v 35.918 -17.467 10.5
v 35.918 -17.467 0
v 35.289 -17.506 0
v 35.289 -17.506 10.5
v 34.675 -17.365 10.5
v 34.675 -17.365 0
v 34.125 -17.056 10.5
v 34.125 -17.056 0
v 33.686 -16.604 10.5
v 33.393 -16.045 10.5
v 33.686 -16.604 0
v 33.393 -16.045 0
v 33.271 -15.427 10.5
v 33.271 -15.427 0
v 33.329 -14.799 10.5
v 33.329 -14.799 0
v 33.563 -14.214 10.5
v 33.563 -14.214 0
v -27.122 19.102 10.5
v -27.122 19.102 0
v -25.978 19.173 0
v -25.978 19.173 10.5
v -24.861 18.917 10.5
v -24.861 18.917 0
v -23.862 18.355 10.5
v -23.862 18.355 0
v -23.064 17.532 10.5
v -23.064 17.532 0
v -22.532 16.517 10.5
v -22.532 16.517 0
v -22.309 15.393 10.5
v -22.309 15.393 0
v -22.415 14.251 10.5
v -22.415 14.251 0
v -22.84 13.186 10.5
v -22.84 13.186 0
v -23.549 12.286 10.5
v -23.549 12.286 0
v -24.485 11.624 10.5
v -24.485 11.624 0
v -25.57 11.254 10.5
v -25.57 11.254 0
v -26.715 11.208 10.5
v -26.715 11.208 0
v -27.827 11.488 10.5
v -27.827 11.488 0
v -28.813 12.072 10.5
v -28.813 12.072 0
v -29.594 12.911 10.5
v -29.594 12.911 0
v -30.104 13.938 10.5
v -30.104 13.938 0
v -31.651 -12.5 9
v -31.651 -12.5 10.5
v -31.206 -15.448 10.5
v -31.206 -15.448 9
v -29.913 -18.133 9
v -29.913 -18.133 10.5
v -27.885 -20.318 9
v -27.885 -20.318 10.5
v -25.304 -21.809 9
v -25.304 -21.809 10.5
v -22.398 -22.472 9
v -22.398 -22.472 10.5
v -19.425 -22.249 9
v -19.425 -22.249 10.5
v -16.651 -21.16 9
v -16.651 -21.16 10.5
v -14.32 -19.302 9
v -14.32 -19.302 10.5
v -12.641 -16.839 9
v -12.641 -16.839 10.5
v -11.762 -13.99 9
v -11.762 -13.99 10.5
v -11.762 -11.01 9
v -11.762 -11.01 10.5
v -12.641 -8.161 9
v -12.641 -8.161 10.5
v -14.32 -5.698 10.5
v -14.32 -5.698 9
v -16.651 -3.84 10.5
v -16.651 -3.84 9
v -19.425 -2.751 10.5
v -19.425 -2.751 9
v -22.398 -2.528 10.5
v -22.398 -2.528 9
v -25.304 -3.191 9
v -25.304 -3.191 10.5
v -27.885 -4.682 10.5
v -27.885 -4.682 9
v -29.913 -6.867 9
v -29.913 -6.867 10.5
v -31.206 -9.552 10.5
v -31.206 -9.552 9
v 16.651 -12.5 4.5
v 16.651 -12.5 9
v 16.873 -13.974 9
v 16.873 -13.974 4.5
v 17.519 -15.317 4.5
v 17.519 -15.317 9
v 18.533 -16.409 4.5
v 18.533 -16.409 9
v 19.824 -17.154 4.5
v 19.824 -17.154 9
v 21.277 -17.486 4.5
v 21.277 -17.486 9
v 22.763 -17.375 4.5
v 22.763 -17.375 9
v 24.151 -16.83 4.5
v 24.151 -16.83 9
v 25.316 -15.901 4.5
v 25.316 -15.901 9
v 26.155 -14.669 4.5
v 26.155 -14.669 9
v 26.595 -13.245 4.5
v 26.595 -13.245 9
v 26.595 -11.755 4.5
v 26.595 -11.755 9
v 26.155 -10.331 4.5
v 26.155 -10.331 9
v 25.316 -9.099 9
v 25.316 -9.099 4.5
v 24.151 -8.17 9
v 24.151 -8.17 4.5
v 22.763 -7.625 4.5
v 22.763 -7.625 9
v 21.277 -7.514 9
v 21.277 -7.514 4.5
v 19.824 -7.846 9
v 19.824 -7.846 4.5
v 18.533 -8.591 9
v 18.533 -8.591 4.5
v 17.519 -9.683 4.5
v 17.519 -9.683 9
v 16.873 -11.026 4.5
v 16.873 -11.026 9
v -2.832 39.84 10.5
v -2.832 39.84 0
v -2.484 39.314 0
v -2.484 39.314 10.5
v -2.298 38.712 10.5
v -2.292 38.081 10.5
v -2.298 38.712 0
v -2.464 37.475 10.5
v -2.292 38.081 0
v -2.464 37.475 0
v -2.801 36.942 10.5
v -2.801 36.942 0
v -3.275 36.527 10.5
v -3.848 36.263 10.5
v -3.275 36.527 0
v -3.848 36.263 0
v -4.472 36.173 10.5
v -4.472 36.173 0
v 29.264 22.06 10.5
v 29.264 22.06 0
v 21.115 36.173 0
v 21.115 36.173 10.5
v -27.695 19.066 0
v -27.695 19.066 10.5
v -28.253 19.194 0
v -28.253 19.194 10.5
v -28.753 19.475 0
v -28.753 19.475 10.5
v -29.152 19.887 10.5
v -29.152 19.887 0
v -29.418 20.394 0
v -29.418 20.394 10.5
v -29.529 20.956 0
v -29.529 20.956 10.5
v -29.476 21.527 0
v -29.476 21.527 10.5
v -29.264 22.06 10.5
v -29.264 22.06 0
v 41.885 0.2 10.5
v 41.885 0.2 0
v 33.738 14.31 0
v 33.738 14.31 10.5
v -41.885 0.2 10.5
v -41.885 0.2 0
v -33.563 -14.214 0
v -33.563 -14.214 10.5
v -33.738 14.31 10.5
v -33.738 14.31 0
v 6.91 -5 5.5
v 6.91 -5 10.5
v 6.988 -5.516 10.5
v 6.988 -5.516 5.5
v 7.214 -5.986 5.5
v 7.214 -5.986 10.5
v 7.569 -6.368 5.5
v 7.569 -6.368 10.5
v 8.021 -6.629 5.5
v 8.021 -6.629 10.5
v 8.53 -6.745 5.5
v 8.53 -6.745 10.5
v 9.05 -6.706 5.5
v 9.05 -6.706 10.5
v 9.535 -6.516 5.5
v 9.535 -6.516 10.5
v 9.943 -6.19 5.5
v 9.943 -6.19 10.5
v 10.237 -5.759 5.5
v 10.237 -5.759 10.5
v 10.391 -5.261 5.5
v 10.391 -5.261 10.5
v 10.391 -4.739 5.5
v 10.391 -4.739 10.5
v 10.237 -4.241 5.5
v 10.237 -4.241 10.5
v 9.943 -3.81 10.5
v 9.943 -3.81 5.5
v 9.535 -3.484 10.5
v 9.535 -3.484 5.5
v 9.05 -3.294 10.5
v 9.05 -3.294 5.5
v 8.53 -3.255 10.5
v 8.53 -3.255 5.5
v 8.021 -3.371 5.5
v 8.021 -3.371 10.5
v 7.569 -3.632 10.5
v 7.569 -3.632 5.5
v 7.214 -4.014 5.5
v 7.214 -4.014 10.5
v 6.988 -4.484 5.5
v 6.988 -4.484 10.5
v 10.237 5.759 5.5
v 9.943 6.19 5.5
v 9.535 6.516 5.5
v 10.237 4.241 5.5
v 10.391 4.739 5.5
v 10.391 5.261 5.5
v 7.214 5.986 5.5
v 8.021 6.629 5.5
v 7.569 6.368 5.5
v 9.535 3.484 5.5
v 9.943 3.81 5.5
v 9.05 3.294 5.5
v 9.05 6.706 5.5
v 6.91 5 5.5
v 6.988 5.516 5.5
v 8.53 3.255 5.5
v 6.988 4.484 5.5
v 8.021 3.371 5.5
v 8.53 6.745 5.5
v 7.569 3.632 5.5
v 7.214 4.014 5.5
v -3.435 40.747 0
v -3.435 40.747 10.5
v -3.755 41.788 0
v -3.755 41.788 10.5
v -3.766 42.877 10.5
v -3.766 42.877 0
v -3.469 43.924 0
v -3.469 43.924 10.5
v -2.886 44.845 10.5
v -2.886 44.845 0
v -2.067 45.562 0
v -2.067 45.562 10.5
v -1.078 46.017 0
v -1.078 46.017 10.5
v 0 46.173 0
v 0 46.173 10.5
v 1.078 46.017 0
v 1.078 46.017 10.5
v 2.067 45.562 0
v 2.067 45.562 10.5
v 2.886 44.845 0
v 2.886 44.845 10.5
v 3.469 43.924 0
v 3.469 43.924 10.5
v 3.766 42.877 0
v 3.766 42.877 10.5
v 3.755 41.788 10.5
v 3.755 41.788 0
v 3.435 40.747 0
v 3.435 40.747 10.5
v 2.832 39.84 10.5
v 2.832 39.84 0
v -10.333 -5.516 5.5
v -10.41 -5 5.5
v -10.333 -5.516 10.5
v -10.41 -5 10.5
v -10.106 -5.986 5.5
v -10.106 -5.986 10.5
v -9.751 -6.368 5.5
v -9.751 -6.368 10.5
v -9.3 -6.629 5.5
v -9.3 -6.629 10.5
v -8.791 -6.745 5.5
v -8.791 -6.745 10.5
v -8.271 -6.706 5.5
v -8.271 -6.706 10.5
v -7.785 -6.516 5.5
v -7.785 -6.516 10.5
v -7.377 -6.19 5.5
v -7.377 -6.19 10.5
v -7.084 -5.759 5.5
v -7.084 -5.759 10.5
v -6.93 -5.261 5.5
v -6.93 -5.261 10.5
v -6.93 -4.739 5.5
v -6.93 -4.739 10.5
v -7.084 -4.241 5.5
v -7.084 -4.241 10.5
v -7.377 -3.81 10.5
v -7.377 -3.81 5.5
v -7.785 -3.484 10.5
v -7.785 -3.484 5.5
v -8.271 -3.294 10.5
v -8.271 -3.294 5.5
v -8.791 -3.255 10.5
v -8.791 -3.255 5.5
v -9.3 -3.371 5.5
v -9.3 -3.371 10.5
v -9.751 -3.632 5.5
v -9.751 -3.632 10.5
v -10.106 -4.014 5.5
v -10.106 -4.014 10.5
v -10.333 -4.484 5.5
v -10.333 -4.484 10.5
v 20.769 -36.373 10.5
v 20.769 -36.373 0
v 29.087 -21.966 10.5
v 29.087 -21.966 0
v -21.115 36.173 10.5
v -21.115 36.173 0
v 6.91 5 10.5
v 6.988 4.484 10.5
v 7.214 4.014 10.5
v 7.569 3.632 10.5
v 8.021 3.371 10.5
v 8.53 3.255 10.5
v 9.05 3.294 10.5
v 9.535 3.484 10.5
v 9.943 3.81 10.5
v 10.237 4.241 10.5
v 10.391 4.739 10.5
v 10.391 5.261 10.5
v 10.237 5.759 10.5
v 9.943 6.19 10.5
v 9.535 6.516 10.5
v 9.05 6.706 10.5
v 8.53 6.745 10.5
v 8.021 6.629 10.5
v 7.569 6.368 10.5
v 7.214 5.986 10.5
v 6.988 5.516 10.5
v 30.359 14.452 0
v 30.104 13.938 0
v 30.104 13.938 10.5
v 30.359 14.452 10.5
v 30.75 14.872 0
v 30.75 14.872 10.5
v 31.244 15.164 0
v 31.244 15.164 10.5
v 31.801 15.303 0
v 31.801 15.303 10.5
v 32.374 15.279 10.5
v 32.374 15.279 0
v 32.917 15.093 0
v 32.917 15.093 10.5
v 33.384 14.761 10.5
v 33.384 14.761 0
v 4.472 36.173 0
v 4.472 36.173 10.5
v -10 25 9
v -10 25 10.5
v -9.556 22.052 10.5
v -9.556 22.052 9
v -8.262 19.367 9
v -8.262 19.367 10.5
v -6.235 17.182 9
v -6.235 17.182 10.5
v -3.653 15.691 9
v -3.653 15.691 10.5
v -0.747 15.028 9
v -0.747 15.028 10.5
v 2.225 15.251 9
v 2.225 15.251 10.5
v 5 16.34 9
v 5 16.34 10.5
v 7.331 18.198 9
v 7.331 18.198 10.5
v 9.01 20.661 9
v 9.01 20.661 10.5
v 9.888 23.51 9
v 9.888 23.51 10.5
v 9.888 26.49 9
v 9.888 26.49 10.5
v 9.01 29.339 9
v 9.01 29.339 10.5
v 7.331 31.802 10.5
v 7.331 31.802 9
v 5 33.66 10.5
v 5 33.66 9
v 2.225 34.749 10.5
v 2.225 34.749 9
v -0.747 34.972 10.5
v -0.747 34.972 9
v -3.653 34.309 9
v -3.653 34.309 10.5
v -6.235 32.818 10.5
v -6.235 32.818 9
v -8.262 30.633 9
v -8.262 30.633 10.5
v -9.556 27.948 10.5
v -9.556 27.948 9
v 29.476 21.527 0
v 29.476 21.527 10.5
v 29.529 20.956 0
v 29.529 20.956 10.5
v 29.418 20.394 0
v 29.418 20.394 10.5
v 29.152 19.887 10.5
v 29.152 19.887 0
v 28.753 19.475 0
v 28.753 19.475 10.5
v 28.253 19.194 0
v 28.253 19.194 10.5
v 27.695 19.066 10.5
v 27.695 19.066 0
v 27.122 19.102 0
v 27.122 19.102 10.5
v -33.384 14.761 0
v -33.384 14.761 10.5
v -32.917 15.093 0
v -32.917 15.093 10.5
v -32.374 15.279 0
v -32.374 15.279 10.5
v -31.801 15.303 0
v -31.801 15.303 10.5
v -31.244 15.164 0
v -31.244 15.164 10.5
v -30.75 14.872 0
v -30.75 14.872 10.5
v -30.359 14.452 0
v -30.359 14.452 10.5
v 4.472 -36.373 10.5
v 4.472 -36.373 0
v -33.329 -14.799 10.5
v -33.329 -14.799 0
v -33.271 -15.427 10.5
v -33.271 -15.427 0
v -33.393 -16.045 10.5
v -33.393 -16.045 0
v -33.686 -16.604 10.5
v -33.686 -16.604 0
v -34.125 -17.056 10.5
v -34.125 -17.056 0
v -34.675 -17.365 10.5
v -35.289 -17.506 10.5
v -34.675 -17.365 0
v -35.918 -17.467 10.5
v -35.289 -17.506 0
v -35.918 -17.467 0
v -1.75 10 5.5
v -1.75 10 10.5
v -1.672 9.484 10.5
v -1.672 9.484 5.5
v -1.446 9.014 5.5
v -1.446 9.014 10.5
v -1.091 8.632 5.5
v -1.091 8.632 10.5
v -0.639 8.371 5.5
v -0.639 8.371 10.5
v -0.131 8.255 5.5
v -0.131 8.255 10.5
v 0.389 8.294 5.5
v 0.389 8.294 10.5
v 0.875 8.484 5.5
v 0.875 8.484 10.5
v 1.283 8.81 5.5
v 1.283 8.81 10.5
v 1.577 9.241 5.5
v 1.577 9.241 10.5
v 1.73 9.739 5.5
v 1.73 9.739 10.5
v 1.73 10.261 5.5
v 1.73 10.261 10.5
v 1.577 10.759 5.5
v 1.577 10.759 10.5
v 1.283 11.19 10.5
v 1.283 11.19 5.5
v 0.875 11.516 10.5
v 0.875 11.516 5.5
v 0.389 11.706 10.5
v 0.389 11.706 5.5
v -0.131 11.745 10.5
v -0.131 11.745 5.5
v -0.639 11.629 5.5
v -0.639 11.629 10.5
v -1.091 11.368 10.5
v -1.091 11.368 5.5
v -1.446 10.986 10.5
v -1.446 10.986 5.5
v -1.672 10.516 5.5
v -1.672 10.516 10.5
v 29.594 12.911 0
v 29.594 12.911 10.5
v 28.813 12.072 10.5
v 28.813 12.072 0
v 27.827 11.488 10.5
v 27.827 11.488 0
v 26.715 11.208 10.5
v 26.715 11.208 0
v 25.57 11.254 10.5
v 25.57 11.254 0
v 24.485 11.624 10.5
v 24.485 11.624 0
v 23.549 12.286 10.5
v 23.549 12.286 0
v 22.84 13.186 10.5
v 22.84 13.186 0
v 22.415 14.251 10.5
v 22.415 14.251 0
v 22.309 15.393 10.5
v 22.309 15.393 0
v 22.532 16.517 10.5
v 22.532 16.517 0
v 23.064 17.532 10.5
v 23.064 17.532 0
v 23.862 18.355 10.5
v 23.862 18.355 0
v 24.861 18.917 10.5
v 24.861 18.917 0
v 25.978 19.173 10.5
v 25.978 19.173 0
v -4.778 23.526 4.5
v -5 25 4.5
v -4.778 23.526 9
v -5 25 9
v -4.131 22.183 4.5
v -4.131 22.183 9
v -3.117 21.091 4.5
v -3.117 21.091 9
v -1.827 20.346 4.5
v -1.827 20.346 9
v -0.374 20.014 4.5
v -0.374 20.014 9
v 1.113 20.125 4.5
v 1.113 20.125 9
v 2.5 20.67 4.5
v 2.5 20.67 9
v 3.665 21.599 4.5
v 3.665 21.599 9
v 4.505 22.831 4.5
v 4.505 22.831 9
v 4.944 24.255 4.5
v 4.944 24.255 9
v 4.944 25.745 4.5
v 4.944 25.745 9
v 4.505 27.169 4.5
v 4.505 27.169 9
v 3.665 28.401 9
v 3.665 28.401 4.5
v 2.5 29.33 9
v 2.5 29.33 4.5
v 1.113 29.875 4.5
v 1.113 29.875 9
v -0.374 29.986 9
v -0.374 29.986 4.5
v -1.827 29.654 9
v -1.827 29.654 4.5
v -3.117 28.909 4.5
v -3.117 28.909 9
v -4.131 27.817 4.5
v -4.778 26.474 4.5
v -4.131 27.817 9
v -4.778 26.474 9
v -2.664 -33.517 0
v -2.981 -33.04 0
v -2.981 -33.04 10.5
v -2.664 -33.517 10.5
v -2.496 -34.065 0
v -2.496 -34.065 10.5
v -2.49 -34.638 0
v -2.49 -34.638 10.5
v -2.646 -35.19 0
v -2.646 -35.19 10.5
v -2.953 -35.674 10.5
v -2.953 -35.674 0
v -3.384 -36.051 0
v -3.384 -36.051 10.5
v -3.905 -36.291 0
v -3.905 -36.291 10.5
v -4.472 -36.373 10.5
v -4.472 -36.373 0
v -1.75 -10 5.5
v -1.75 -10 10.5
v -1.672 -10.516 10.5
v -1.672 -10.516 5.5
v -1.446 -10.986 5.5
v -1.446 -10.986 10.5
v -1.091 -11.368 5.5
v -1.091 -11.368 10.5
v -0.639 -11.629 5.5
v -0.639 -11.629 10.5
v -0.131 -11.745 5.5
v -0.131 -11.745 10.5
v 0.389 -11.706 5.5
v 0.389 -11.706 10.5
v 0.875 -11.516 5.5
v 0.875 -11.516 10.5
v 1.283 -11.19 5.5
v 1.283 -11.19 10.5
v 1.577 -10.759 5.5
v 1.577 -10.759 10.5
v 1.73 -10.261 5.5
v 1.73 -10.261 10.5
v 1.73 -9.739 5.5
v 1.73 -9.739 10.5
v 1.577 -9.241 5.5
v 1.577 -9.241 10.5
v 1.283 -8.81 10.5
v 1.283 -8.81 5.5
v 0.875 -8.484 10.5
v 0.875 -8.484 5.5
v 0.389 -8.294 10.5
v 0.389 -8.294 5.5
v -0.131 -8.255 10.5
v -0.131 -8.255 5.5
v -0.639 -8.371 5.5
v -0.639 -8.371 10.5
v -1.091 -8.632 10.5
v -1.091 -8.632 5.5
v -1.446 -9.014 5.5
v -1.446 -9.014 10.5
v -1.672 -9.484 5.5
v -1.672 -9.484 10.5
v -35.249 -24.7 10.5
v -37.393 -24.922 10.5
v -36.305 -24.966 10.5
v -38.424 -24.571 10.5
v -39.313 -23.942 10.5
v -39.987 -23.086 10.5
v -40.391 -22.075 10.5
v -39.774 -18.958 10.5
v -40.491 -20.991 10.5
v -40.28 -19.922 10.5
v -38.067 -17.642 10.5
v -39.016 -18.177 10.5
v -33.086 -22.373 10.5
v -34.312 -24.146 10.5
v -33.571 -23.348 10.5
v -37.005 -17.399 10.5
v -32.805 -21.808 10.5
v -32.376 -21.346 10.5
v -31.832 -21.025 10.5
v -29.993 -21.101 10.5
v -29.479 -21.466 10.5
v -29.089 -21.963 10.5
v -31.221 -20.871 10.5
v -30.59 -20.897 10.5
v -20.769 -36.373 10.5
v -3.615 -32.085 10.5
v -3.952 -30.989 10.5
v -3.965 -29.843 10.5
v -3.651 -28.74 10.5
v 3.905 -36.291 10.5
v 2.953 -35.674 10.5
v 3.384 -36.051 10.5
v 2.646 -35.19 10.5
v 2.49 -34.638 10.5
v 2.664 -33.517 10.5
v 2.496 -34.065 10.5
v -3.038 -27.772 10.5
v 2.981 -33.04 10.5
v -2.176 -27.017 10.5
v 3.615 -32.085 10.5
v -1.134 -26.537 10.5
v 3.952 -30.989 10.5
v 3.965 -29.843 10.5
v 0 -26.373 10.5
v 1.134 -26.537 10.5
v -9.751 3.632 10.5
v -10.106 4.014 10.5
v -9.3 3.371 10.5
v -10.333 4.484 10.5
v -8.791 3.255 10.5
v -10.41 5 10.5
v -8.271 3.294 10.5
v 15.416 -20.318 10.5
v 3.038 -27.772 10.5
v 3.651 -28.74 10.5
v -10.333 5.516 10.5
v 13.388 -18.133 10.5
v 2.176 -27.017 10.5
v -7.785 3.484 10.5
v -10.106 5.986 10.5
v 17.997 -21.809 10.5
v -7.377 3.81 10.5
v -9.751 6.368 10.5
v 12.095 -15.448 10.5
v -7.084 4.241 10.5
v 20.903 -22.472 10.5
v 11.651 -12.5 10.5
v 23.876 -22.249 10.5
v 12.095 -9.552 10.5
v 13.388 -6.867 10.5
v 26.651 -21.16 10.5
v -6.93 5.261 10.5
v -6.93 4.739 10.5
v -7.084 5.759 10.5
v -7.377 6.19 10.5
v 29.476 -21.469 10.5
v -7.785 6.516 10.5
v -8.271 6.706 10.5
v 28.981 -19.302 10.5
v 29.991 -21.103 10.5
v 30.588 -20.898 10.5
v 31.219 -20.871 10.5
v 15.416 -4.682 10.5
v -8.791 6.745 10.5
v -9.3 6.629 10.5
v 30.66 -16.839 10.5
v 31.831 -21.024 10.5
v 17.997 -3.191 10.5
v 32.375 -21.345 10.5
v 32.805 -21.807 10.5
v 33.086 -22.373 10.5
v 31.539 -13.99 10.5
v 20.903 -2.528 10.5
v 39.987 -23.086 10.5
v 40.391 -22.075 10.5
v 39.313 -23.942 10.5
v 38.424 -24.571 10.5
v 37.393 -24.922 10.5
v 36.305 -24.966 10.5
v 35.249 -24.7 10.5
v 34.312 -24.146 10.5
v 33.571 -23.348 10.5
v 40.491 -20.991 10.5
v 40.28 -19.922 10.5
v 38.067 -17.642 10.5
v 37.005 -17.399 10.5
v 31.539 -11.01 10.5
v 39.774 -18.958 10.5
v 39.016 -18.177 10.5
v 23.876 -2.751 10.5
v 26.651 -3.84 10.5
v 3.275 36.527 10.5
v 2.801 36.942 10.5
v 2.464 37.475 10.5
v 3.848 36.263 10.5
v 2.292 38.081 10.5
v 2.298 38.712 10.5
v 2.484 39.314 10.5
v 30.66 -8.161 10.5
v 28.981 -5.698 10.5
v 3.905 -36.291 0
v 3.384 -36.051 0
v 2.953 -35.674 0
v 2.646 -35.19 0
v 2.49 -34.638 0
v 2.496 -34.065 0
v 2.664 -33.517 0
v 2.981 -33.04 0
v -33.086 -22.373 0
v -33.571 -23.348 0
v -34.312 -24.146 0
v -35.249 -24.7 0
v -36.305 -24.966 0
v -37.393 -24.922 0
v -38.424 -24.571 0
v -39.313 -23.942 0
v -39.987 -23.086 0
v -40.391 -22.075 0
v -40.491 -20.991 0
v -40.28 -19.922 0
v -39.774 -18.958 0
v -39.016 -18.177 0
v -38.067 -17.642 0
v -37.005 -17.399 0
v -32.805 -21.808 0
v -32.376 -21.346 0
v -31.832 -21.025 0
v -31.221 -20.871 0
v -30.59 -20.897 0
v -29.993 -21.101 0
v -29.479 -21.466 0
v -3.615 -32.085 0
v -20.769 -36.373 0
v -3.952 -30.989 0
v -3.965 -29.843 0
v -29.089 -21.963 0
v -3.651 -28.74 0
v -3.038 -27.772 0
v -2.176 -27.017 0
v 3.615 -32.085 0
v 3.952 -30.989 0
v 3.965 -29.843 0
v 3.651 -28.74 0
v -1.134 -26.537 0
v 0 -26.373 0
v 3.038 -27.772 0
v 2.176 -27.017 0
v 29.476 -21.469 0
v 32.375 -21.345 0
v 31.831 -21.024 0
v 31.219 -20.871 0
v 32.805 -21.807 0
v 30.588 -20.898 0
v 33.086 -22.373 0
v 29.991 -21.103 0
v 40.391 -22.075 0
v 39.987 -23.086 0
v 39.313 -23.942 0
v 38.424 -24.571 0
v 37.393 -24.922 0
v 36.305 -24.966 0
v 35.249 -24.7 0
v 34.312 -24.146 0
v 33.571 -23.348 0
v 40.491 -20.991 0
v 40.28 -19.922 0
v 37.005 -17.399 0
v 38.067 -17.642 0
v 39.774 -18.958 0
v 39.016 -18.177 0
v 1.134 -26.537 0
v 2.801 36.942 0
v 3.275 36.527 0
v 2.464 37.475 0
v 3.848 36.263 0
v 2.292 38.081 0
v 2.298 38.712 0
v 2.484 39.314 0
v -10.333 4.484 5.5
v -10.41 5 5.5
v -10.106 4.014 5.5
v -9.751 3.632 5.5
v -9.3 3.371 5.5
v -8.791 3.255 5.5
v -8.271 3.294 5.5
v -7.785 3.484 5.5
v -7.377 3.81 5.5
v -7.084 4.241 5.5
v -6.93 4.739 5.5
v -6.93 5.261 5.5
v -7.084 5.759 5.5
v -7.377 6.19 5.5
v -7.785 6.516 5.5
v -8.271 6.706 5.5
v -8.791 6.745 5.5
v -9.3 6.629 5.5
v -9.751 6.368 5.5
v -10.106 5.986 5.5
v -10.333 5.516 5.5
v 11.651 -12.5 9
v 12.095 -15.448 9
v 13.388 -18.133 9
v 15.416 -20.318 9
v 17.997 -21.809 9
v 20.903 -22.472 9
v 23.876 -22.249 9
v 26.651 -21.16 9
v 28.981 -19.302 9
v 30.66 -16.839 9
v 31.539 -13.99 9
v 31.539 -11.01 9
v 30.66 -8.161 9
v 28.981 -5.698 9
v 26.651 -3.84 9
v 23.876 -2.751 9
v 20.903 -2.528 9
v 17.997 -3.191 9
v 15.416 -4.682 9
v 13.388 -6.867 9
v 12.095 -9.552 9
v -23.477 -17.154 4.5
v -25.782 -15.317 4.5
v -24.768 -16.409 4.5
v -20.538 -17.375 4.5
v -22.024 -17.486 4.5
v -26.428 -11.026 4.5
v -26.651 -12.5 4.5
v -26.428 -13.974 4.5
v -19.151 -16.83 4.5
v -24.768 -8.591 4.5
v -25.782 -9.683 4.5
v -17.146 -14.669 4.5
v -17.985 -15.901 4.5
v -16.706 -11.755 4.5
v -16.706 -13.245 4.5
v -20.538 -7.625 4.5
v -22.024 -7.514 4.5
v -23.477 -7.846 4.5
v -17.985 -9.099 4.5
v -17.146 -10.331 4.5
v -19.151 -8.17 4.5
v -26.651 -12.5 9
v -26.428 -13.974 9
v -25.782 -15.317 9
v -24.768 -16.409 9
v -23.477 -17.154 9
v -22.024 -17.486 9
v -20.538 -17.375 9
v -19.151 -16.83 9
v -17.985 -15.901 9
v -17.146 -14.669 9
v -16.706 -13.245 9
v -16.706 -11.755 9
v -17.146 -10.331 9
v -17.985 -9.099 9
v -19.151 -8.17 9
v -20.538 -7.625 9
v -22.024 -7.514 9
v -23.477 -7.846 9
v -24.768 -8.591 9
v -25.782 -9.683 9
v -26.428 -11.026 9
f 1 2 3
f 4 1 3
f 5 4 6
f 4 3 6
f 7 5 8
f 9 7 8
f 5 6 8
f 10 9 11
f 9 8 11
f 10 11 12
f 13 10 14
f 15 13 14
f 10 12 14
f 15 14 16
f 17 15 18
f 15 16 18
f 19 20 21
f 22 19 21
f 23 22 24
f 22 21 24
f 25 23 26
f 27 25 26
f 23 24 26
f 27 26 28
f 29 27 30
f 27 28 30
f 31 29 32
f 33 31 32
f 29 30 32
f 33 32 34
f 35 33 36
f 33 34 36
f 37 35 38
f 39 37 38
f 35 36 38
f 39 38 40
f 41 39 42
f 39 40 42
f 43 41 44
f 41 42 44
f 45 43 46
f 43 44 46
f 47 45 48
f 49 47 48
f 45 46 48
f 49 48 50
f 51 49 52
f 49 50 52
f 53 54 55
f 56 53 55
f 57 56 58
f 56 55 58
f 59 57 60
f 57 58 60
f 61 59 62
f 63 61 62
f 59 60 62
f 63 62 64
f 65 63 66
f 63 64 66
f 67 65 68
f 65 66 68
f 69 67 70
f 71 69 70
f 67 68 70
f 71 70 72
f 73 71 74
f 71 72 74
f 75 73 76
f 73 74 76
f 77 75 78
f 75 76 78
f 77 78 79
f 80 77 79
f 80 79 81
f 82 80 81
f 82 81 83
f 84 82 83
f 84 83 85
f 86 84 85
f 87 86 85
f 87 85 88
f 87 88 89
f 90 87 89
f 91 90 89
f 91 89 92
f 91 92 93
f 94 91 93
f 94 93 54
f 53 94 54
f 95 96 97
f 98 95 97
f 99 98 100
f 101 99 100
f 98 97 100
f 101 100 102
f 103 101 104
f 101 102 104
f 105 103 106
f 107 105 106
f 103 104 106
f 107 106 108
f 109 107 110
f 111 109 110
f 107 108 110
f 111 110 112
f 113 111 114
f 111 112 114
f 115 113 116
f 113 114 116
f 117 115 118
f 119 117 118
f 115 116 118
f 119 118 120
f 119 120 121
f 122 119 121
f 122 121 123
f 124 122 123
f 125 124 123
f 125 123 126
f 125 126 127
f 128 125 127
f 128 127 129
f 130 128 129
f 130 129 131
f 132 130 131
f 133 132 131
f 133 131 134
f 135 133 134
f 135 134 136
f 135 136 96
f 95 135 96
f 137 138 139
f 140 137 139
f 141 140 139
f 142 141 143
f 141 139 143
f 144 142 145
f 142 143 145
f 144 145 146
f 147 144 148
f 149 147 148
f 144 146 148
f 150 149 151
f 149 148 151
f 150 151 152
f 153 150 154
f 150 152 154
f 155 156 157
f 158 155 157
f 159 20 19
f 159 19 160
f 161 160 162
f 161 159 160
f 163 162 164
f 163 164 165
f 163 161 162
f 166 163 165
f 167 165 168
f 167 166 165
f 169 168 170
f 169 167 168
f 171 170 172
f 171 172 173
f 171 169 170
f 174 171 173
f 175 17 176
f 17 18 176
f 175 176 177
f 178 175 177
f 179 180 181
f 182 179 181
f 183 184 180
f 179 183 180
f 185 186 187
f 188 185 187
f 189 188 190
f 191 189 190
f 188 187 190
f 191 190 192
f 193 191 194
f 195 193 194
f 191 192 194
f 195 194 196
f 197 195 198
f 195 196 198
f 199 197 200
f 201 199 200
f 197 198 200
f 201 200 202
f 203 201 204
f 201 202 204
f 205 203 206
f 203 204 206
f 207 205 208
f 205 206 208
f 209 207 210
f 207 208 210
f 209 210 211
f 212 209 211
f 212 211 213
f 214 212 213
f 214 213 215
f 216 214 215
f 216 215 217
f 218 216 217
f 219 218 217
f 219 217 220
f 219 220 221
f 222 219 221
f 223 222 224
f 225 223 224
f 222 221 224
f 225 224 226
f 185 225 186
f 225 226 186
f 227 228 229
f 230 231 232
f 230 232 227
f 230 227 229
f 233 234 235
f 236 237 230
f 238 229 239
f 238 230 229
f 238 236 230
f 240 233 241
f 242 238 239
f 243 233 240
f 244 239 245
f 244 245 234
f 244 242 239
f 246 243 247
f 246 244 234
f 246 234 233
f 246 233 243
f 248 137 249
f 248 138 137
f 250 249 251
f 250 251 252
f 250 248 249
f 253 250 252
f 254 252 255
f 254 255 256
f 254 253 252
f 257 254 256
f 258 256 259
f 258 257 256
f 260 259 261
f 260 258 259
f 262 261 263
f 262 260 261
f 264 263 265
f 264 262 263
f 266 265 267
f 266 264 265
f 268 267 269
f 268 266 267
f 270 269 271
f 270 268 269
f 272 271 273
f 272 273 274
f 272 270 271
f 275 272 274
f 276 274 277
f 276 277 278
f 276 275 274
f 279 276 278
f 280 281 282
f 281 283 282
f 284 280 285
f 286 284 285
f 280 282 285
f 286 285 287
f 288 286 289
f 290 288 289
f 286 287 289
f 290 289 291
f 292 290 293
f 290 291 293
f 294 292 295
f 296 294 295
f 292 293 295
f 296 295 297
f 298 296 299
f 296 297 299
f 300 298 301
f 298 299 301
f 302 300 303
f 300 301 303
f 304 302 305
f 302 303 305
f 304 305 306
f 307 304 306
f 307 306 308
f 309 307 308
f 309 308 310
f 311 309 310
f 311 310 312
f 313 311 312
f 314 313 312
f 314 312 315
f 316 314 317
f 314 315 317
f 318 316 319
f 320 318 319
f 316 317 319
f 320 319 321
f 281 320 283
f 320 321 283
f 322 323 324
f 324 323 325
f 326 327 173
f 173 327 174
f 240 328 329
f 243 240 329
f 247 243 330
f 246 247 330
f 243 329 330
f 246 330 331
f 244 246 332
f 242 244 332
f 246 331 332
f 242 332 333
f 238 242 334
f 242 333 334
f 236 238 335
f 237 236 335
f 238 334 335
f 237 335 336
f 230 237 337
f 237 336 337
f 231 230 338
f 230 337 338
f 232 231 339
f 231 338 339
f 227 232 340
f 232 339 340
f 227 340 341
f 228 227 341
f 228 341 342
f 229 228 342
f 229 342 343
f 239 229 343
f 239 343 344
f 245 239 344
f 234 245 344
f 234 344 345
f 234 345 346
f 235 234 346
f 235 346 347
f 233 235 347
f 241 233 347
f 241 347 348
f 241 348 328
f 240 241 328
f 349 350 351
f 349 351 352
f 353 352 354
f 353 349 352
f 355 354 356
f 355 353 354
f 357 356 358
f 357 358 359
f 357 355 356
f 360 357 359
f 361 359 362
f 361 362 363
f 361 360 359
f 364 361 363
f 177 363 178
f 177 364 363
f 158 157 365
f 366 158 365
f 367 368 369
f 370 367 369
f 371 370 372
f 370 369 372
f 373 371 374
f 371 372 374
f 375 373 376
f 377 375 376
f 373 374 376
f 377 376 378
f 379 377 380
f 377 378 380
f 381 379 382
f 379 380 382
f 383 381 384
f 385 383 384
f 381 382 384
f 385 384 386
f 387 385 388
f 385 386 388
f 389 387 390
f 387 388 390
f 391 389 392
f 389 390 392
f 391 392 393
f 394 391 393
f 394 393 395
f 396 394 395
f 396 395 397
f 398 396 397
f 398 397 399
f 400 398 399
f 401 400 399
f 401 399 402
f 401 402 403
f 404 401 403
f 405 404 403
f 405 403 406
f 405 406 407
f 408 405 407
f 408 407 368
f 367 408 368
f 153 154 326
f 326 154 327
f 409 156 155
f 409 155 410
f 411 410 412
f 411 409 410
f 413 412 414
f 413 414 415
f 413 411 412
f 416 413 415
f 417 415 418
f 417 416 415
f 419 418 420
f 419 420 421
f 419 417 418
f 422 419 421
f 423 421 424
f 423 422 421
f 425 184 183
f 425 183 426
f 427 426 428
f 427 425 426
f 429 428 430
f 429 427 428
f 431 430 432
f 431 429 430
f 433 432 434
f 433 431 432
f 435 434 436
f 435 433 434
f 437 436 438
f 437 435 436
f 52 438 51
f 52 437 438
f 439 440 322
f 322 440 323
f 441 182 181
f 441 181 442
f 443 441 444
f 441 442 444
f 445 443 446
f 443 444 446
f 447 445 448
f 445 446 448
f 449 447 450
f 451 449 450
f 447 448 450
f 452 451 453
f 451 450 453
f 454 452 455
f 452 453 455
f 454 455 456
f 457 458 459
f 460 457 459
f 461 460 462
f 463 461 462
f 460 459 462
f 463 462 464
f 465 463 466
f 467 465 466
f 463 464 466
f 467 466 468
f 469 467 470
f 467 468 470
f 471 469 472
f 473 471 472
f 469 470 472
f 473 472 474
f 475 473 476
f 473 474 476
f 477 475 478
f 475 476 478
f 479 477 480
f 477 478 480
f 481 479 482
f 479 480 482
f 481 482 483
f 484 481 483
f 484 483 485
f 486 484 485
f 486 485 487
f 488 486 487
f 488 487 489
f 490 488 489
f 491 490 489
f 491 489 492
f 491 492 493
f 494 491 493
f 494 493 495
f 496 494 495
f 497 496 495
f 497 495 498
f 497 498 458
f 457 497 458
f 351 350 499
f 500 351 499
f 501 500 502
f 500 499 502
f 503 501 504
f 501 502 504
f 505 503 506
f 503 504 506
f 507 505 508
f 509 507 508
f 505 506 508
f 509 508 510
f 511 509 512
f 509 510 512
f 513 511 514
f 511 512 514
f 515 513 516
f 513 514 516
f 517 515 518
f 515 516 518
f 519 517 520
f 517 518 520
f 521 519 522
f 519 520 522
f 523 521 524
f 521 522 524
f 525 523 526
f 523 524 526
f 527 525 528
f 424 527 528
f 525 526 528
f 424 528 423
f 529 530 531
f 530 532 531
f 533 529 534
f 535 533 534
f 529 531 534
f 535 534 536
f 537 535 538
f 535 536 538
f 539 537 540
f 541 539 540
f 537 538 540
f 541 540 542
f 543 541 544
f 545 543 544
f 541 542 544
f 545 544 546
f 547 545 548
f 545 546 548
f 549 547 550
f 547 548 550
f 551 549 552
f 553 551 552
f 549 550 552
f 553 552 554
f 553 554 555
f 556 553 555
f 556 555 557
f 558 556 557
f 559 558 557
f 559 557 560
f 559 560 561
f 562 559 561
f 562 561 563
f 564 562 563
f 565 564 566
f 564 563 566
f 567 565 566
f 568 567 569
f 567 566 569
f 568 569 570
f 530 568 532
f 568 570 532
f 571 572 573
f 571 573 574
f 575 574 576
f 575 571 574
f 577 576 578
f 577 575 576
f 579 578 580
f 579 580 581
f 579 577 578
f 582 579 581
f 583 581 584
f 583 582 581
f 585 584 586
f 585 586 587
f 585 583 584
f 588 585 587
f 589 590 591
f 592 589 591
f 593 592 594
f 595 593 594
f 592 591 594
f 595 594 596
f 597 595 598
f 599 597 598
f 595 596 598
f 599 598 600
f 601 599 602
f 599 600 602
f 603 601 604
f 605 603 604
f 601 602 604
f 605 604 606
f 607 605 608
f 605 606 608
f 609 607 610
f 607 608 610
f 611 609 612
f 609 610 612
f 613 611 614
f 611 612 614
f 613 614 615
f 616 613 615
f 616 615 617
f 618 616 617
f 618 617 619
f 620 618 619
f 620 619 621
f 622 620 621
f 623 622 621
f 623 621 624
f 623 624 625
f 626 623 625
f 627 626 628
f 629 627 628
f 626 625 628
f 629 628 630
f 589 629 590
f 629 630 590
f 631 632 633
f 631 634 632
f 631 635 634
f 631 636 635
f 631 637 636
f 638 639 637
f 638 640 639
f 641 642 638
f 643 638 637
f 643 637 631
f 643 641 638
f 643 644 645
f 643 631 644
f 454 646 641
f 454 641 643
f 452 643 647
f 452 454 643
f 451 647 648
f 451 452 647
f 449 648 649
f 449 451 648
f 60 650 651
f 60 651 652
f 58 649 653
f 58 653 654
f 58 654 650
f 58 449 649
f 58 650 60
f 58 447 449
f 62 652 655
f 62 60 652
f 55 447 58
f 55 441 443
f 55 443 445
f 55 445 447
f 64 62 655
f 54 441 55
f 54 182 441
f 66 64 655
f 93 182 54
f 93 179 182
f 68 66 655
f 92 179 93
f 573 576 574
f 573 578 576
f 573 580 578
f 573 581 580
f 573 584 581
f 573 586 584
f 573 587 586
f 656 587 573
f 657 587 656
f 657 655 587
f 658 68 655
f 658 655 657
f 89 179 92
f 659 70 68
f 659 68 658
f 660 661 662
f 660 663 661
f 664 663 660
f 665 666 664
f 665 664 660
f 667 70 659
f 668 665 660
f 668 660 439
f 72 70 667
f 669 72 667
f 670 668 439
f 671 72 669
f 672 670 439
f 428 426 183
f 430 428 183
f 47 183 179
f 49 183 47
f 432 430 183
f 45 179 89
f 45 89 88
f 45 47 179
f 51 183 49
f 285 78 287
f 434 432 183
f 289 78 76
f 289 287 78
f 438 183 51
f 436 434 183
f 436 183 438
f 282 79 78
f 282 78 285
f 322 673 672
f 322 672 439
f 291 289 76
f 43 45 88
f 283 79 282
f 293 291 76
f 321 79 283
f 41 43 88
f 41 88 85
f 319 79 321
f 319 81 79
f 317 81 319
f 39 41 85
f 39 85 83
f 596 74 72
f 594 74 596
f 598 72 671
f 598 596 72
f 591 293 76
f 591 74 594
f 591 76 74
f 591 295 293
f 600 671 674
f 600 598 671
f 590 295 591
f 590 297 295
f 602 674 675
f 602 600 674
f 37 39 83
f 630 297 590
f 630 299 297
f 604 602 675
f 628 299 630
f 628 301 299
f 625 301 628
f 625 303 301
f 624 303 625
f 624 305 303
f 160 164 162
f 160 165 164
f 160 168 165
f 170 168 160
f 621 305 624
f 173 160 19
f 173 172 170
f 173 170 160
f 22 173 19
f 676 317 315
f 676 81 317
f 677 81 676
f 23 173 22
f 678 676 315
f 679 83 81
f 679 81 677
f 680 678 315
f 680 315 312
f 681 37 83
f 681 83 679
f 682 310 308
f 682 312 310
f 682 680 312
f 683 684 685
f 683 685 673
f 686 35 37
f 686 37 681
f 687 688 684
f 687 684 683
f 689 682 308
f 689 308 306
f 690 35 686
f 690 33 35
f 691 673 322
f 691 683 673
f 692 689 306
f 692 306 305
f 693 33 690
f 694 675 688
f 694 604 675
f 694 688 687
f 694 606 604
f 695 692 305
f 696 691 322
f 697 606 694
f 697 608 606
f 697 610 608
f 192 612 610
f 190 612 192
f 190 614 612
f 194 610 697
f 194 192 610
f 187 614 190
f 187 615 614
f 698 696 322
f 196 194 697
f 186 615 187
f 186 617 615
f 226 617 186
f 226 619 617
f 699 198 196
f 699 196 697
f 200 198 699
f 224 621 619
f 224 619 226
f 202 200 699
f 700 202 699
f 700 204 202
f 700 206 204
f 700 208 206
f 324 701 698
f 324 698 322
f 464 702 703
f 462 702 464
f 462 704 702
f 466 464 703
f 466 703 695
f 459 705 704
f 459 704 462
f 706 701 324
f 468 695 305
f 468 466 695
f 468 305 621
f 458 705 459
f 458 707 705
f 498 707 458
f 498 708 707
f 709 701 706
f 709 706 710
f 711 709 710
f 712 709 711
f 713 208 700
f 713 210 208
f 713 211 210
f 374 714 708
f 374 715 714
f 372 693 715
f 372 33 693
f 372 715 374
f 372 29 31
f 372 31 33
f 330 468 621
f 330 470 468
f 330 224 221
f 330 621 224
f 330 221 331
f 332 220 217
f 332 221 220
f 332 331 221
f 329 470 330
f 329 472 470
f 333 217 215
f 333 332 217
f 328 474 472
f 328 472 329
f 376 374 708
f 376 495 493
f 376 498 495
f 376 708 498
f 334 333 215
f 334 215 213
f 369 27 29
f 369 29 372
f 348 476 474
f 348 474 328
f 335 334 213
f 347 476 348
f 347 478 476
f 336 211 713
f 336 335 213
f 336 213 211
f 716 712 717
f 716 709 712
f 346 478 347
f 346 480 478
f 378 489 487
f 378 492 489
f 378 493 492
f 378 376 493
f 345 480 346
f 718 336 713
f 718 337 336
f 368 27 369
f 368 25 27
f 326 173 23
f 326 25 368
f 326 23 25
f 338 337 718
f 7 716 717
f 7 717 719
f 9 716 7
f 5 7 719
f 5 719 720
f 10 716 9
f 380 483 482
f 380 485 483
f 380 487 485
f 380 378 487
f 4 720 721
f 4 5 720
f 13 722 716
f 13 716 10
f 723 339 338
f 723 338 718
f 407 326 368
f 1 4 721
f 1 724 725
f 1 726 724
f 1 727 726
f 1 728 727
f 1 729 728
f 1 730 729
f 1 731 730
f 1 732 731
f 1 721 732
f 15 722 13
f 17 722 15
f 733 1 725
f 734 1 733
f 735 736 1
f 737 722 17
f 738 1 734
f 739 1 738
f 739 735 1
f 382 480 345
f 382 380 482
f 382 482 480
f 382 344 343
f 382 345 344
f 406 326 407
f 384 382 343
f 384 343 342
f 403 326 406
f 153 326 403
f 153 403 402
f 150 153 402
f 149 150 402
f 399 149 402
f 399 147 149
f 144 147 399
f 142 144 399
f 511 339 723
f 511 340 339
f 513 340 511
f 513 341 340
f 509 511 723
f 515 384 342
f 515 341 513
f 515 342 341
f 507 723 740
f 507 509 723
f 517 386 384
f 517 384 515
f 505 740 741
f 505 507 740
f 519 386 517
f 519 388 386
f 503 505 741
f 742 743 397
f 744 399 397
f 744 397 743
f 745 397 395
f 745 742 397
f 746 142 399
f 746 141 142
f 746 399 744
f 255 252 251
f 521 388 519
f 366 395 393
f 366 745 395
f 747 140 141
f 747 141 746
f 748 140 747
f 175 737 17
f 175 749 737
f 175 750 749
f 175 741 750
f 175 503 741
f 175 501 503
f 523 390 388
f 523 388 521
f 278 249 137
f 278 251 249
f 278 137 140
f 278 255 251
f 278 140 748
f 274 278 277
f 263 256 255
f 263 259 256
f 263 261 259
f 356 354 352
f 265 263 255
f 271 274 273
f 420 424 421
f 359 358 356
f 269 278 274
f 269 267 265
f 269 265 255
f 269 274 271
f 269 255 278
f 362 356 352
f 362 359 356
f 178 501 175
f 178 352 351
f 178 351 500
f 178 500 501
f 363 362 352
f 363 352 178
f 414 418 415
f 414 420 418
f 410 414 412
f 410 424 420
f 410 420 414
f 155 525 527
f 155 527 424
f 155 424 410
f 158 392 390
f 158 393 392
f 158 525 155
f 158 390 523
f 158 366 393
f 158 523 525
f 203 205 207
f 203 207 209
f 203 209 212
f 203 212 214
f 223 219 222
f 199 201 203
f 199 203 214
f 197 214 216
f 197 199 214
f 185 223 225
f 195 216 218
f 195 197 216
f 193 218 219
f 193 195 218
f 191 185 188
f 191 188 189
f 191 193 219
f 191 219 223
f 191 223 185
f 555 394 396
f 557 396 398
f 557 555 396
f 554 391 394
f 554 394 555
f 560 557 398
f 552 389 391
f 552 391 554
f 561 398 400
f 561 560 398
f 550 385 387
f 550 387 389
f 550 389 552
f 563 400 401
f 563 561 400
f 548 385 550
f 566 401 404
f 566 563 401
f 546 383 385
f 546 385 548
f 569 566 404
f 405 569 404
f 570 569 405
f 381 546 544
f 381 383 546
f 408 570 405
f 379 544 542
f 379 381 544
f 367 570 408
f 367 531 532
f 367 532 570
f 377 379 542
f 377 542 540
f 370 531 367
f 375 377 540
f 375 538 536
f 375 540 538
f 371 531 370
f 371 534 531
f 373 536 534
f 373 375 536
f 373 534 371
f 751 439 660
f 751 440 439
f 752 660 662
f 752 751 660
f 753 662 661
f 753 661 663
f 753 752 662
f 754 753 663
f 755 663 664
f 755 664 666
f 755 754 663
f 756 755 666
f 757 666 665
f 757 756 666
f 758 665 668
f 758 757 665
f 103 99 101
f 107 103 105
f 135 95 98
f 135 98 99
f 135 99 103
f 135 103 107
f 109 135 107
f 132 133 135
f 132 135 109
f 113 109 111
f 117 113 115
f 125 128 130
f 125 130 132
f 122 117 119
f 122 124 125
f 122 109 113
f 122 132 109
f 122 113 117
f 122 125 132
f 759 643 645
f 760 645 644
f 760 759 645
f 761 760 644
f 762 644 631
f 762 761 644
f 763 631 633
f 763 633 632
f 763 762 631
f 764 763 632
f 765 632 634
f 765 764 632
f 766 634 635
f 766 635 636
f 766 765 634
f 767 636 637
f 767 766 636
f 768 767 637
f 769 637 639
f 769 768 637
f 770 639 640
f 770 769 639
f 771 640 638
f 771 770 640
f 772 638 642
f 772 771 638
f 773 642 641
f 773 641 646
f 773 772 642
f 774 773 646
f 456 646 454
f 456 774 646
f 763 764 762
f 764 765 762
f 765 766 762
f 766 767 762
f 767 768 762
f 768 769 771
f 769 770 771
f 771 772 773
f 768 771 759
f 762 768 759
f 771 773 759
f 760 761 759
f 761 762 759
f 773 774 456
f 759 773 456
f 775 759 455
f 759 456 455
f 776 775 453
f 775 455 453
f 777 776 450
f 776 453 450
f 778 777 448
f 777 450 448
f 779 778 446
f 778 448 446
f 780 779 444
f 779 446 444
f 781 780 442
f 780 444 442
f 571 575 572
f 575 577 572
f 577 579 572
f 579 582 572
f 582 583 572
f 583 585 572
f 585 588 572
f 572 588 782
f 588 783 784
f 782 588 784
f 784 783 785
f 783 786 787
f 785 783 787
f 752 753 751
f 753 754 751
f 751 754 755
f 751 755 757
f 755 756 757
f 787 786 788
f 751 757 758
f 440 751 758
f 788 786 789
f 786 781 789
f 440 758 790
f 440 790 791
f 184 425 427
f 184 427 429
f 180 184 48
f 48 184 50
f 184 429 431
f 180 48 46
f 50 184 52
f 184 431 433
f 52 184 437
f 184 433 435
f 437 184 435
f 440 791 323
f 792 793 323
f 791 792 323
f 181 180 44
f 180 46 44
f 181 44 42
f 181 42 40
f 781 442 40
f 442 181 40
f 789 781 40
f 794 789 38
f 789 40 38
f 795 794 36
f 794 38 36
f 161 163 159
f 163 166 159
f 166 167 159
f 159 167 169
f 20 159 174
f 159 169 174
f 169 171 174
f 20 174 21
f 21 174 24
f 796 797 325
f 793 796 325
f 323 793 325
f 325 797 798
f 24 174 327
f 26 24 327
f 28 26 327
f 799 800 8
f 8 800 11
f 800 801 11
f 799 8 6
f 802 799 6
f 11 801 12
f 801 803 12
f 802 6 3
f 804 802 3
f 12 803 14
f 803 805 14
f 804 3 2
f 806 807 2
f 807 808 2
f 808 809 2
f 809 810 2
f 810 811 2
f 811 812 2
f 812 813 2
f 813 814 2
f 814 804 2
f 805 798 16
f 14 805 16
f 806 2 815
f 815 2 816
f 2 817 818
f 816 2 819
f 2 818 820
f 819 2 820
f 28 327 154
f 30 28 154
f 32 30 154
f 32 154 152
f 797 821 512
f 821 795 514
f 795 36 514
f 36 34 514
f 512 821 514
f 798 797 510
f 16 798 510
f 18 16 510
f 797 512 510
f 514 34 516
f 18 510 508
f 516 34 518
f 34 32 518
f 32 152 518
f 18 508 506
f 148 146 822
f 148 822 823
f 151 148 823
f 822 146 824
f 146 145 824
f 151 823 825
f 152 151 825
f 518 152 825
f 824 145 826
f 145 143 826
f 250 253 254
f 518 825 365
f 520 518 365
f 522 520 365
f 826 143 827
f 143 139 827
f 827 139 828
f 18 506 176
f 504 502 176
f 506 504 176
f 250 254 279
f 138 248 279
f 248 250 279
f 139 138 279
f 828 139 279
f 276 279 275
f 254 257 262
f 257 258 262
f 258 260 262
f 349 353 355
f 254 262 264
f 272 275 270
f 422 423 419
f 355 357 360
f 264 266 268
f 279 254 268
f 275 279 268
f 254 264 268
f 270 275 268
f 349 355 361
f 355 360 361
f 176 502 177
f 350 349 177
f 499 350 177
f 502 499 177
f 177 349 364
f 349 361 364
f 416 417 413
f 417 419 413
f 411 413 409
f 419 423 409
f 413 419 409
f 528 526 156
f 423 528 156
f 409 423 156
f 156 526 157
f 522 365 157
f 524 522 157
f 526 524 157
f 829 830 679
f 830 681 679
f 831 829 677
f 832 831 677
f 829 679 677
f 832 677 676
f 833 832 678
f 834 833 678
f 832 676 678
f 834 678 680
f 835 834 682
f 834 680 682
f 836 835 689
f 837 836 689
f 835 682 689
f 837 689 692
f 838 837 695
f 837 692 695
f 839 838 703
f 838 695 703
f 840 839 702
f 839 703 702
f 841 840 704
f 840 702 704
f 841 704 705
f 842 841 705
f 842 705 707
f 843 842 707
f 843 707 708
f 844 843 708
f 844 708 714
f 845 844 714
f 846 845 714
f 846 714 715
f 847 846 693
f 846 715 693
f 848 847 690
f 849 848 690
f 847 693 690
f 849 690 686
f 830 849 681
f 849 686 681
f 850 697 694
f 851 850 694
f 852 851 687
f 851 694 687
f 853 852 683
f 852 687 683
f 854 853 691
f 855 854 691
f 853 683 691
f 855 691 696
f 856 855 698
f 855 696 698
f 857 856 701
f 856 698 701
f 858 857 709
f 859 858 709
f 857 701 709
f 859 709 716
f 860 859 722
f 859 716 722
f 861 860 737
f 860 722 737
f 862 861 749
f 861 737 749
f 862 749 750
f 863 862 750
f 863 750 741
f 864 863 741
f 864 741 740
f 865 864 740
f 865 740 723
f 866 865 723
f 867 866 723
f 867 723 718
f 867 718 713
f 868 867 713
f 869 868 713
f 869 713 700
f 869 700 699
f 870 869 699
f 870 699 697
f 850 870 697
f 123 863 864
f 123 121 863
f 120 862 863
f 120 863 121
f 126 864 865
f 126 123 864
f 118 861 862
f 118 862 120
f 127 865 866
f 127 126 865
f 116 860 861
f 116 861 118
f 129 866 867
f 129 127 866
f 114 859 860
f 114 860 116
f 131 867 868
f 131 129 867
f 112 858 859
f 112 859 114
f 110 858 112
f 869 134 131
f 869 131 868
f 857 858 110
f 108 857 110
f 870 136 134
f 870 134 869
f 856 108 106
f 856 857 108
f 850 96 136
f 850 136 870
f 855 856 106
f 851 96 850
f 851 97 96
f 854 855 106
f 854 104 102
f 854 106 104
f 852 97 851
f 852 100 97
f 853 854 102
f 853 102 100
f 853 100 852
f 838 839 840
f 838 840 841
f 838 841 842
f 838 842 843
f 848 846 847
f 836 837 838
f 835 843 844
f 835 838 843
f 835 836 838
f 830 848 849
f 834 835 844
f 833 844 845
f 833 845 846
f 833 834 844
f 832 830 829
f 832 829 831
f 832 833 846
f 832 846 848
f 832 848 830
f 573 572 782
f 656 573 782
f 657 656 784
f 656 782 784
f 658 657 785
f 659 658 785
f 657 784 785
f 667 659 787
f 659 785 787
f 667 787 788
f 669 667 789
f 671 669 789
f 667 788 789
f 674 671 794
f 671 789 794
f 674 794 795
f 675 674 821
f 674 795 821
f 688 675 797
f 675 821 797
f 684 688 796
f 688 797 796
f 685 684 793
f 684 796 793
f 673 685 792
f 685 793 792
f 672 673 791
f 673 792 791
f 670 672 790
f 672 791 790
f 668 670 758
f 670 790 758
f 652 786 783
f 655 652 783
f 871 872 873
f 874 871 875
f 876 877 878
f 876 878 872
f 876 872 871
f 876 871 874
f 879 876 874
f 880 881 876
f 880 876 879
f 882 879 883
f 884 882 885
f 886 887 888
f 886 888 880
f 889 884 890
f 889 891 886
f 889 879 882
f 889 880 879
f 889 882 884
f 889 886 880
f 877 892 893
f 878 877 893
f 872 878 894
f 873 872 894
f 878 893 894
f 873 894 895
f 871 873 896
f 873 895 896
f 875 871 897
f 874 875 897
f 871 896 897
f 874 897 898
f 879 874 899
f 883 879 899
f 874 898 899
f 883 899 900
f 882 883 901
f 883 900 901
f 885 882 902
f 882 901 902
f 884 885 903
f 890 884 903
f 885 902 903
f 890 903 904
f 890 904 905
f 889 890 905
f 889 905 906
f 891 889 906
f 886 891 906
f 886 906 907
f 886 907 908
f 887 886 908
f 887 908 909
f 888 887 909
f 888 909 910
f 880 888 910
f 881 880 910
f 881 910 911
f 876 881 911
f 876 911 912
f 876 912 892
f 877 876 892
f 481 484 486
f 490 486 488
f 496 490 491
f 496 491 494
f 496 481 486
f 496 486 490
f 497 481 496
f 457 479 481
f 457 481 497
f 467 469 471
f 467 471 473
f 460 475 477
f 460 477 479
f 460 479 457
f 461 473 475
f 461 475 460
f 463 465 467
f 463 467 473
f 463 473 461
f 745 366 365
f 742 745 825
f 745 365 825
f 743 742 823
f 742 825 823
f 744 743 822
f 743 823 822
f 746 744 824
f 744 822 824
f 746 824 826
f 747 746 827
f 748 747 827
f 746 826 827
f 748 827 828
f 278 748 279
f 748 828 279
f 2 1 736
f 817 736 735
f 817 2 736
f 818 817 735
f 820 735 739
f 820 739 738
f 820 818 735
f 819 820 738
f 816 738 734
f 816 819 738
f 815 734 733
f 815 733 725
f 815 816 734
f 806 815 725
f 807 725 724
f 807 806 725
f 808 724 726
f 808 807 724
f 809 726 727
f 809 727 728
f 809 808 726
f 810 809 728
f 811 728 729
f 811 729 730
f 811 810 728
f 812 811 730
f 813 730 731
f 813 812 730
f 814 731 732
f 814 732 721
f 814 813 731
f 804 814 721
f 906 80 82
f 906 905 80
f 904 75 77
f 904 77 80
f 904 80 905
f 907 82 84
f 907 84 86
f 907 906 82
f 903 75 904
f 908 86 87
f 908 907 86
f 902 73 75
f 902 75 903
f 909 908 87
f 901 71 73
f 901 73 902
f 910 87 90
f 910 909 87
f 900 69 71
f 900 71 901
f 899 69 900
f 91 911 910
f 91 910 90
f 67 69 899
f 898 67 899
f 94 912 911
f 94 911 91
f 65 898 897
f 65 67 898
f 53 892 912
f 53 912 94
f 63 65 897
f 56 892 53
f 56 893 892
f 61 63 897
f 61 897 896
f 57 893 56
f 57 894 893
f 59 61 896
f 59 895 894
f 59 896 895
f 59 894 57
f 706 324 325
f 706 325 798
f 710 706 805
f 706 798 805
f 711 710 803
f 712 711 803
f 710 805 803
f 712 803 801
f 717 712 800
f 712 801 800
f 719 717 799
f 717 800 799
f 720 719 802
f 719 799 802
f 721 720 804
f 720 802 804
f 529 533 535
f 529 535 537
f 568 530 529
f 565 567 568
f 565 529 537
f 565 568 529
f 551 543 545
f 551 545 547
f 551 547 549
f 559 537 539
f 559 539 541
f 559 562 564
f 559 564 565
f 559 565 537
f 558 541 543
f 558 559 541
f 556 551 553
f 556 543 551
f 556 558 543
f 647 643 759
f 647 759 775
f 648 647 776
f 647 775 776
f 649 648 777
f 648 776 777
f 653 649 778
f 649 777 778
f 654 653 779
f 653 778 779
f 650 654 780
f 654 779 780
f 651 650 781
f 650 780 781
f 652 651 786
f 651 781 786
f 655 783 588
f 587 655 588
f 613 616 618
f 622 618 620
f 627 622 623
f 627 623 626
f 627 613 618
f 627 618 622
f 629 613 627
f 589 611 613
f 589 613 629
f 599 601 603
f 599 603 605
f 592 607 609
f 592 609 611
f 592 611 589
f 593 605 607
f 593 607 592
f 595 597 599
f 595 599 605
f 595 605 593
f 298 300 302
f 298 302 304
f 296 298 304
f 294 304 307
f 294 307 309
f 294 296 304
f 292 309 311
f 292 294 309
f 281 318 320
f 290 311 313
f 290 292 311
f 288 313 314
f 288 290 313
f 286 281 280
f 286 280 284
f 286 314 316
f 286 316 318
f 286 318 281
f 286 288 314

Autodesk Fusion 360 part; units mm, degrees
sketch "Sketch1" plane through (0, 0, 0) normal (0, 0, 1) x (1, 0, 0)
  line L0 (42, 0) -> (21, 36.3731)
  line L1 (21, 36.3731) -> (-21, 36.3731)
  line L2 (-21, 36.3731) -> (-42, 0)
  line L3 (-42, 0) -> (-21, -36.3731)
  line L4 (-21, -36.3731) -> (21, -36.3731)
  line L5 (21, -36.3731) -> (42, 0)
  circle A0 centre (0, 42.3731) radius 4
  line L6 (0, 41) -> (0, 36.3731)
  arc A1 (2.9814, 39.7064) -> (4.4721, 36.3731) centre (4.4721, 38.3731) ccw
  arc A2 (-4.4721, 36.3731) -> (-2.9814, 39.7064) centre (-4.4721, 38.3731) ccw
  circle A3 centre (-36.6962, -21.1865) radius 4
  arc A4 (-29.2639, -22.0595) -> (-32.896, -22.4352) centre (-30.996, -23.0595) ccw
  arc A5 (-35.8775, -17.2712) -> (-33.7361, -14.3136) centre (-35.4681, -15.3136) ccw
  circle A6 centre (36.6962, -21.1865) radius 4
  arc A7 (33.7361, -14.3136) -> (35.8775, -17.2712) centre (35.4681, -15.3136) ccw
  arc A8 (32.896, -22.4352) -> (29.2639, -22.0595) centre (30.996, -23.0595) ccw
  circle A9 centre (-26.3038, 15.1865) radius 4
  arc A10 (-29.2639, 22.0595) -> (-27.1225, 19.1019) centre (-27.5319, 21.0595) ccw
  arc A11 (-30.104, 13.9379) -> (-33.7361, 14.3136) centre (-32.004, 13.3136) ccw
  circle A12 centre (0, -30.3731) radius 4
  arc A13 (-4.4721, -36.3731) -> (-2.9814, -33.0397) centre (-4.4721, -34.3731) ccw
  arc A14 (2.9814, -33.0397) -> (4.4721, -36.3731) centre (4.4721, -34.3731) ccw
  circle A15 centre (26.3038, 15.1865) radius 4
  arc A16 (33.7361, 14.3136) -> (30.104, 13.9379) centre (32.004, 13.3136) ccw
  arc A17 (27.1225, 19.1019) -> (29.2639, 22.0595) centre (27.5319, 21.0595) ccw
  dimension "d1" = 42
  dimension "d2" = 8
  dimension "d3" = 6
  dimension "d4" = 4
  dimension "d6" = 360
  dimension "d10" = 360
extrude "Extrude1" add sketch "Sketch1" along normal blind 10.5 contours L0 L1 L2 L3 L4 L5 A9 A10 A11 A12 A13 A14 A15 A16 A17 | L5 A6 A7 A8 | A6 | L1 A0 L6 A1 | L1 A0 L6 A2 | A0 | L3 A3 A4 A5 | A3
move_face "OffsetFaces1" offset -0.2 9 faces at (35.4632, -24.9918, 7) (29.3138, -21.9777, 7) (-37.9917, -24.9709, 7) (-30.5353, -21.1133, 7) (34.8369, -17.2113, 7) (-3.1097, 39.8571, 7) (2.513, 38.7754, 7) (-34.8369, -17.2113, 7) (-2.513, 38.7754, 7)
sketch "Sketch2" plane through (0, 0, 10.5) normal (0, 0, 1) x (-1, 0, 0)
  line L0 (-33.5629, 14.2136) -> (-41.8845, -0.2)
  line L1 (-41.8845, -0.2) -> (-33.7361, -14.3136)
  arc A0 (-33.7361, -14.3136) -> (-30.104, -13.9379) centre (-32.004, -13.3136) ccw
  arc A1 (-27.1225, -19.1019) -> (-30.104, -13.9379) centre (-26.3038, -15.1865) ccw
  arc A2 (-27.1225, -19.1019) -> (-29.2639, -22.0595) centre (-27.5319, -21.0595) ccw
  line L2 (-29.2639, -22.0595) -> (-21.1155, -36.1731)
  line L3 (-21.1155, -36.1731) -> (-4.4721, -36.1731)
  arc A3 (-2.8324, -39.8397) -> (-4.4721, -36.1731) centre (-4.4721, -38.3731) ccw
  arc A4 (-2.8324, -39.8397) -> (2.8324, -39.8397) centre (0, -42.3731) ccw
  arc A5 (4.4721, -36.1731) -> (2.8324, -39.8397) centre (4.4721, -38.3731) ccw
  line L4 (4.4721, -36.1731) -> (21.1155, -36.1731)
  line L5 (21.1155, -36.1731) -> (29.2639, -22.0595)
  arc A6 (29.2639, -22.0595) -> (27.1225, -19.1019) centre (27.5319, -21.0595) ccw
  arc A7 (30.104, -13.9379) -> (27.1225, -19.1019) centre (26.3038, -15.1865) ccw
  arc A8 (30.104, -13.9379) -> (33.7361, -14.3136) centre (32.004, -13.3136) ccw
  line L6 (33.7361, -14.3136) -> (41.8845, -0.2)
  line L7 (41.8845, -0.2) -> (33.5629, 14.2136)
  arc A9 (35.9184, 17.467) -> (33.5629, 14.2136) centre (35.4681, 15.3136) ccw
  arc A10 (35.9184, 17.467) -> (33.086, 22.3728) centre (36.6962, 21.1865) ccw
  arc A11 (29.0907, 21.9595) -> (33.086, 22.3728) centre (30.996, 23.0595) ccw
  line L8 (29.0907, 21.9595) -> (20.7691, 36.3731)
  line L9 (20.7691, 36.3731) -> (4.4721, 36.3731)
  arc A12 (4.4721, 36.3731) -> (2.9814, 33.0397) centre (4.4721, 34.3731) ccw
  arc A13 (-2.9814, 33.0397) -> (2.9814, 33.0397) centre (0, 30.3731) ccw
  arc A14 (-2.9814, 33.0397) -> (-4.4721, 36.3731) centre (-4.4721, 34.3731) ccw
  line L10 (-4.4721, 36.3731) -> (-20.7691, 36.3731)
  line L11 (-20.7691, 36.3731) -> (-29.0907, 21.9595)
  arc A15 (-33.086, 22.3728) -> (-29.0907, 21.9595) centre (-30.996, 23.0595) ccw
  arc A16 (-33.086, 22.3728) -> (-35.9184, 17.467) centre (-36.6962, 21.1865) ccw
  arc A17 (-33.5629, 14.2136) -> (-35.9184, 17.467) centre (-35.4681, 15.3136) ccw
  circle A18 centre (0, -25) radius 10
  circle A19 centre (0, -25) radius 5
  circle A20 centre (0, -10) radius 1.75
  circle A21 centre (21.6506, 12.5) radius 5
  circle A22 centre (21.6506, 12.5) radius 10
  circle A23 centre (-21.6506, 12.5) radius 5
  circle A24 centre (-21.6506, 12.5) radius 10
  circle A25 centre (8.6603, -5) radius 1.75
  circle A26 centre (8.6603, 5) radius 1.75
  circle A27 centre (0, 10) radius 1.75
  circle A28 centre (-8.6603, 5) radius 1.75
  circle A29 centre (-8.6603, -5) radius 1.75
  dimension "d14" = 10
  dimension "d15" = 20
  dimension "d16" = 3.5
  dimension "d18" = 360
  dimension "d20" = 360
extrude "Extrude2" cut sketch "Sketch2" against normal blind 1.5 contours A18 | A22 | A24
extrude "Extrude3" cut 3 faces at (-2.3344, 25.4913, 10.5) (-21.8157, -11.3785, 10.5) (21.4856, -11.3785, 10.5) along direction (0, 0, -1) blind 6
extrude "Extrude4" cut sketch "Sketch2" against normal blind 5 contours A20 | A25 | A26 | A27 | A28 | A29
